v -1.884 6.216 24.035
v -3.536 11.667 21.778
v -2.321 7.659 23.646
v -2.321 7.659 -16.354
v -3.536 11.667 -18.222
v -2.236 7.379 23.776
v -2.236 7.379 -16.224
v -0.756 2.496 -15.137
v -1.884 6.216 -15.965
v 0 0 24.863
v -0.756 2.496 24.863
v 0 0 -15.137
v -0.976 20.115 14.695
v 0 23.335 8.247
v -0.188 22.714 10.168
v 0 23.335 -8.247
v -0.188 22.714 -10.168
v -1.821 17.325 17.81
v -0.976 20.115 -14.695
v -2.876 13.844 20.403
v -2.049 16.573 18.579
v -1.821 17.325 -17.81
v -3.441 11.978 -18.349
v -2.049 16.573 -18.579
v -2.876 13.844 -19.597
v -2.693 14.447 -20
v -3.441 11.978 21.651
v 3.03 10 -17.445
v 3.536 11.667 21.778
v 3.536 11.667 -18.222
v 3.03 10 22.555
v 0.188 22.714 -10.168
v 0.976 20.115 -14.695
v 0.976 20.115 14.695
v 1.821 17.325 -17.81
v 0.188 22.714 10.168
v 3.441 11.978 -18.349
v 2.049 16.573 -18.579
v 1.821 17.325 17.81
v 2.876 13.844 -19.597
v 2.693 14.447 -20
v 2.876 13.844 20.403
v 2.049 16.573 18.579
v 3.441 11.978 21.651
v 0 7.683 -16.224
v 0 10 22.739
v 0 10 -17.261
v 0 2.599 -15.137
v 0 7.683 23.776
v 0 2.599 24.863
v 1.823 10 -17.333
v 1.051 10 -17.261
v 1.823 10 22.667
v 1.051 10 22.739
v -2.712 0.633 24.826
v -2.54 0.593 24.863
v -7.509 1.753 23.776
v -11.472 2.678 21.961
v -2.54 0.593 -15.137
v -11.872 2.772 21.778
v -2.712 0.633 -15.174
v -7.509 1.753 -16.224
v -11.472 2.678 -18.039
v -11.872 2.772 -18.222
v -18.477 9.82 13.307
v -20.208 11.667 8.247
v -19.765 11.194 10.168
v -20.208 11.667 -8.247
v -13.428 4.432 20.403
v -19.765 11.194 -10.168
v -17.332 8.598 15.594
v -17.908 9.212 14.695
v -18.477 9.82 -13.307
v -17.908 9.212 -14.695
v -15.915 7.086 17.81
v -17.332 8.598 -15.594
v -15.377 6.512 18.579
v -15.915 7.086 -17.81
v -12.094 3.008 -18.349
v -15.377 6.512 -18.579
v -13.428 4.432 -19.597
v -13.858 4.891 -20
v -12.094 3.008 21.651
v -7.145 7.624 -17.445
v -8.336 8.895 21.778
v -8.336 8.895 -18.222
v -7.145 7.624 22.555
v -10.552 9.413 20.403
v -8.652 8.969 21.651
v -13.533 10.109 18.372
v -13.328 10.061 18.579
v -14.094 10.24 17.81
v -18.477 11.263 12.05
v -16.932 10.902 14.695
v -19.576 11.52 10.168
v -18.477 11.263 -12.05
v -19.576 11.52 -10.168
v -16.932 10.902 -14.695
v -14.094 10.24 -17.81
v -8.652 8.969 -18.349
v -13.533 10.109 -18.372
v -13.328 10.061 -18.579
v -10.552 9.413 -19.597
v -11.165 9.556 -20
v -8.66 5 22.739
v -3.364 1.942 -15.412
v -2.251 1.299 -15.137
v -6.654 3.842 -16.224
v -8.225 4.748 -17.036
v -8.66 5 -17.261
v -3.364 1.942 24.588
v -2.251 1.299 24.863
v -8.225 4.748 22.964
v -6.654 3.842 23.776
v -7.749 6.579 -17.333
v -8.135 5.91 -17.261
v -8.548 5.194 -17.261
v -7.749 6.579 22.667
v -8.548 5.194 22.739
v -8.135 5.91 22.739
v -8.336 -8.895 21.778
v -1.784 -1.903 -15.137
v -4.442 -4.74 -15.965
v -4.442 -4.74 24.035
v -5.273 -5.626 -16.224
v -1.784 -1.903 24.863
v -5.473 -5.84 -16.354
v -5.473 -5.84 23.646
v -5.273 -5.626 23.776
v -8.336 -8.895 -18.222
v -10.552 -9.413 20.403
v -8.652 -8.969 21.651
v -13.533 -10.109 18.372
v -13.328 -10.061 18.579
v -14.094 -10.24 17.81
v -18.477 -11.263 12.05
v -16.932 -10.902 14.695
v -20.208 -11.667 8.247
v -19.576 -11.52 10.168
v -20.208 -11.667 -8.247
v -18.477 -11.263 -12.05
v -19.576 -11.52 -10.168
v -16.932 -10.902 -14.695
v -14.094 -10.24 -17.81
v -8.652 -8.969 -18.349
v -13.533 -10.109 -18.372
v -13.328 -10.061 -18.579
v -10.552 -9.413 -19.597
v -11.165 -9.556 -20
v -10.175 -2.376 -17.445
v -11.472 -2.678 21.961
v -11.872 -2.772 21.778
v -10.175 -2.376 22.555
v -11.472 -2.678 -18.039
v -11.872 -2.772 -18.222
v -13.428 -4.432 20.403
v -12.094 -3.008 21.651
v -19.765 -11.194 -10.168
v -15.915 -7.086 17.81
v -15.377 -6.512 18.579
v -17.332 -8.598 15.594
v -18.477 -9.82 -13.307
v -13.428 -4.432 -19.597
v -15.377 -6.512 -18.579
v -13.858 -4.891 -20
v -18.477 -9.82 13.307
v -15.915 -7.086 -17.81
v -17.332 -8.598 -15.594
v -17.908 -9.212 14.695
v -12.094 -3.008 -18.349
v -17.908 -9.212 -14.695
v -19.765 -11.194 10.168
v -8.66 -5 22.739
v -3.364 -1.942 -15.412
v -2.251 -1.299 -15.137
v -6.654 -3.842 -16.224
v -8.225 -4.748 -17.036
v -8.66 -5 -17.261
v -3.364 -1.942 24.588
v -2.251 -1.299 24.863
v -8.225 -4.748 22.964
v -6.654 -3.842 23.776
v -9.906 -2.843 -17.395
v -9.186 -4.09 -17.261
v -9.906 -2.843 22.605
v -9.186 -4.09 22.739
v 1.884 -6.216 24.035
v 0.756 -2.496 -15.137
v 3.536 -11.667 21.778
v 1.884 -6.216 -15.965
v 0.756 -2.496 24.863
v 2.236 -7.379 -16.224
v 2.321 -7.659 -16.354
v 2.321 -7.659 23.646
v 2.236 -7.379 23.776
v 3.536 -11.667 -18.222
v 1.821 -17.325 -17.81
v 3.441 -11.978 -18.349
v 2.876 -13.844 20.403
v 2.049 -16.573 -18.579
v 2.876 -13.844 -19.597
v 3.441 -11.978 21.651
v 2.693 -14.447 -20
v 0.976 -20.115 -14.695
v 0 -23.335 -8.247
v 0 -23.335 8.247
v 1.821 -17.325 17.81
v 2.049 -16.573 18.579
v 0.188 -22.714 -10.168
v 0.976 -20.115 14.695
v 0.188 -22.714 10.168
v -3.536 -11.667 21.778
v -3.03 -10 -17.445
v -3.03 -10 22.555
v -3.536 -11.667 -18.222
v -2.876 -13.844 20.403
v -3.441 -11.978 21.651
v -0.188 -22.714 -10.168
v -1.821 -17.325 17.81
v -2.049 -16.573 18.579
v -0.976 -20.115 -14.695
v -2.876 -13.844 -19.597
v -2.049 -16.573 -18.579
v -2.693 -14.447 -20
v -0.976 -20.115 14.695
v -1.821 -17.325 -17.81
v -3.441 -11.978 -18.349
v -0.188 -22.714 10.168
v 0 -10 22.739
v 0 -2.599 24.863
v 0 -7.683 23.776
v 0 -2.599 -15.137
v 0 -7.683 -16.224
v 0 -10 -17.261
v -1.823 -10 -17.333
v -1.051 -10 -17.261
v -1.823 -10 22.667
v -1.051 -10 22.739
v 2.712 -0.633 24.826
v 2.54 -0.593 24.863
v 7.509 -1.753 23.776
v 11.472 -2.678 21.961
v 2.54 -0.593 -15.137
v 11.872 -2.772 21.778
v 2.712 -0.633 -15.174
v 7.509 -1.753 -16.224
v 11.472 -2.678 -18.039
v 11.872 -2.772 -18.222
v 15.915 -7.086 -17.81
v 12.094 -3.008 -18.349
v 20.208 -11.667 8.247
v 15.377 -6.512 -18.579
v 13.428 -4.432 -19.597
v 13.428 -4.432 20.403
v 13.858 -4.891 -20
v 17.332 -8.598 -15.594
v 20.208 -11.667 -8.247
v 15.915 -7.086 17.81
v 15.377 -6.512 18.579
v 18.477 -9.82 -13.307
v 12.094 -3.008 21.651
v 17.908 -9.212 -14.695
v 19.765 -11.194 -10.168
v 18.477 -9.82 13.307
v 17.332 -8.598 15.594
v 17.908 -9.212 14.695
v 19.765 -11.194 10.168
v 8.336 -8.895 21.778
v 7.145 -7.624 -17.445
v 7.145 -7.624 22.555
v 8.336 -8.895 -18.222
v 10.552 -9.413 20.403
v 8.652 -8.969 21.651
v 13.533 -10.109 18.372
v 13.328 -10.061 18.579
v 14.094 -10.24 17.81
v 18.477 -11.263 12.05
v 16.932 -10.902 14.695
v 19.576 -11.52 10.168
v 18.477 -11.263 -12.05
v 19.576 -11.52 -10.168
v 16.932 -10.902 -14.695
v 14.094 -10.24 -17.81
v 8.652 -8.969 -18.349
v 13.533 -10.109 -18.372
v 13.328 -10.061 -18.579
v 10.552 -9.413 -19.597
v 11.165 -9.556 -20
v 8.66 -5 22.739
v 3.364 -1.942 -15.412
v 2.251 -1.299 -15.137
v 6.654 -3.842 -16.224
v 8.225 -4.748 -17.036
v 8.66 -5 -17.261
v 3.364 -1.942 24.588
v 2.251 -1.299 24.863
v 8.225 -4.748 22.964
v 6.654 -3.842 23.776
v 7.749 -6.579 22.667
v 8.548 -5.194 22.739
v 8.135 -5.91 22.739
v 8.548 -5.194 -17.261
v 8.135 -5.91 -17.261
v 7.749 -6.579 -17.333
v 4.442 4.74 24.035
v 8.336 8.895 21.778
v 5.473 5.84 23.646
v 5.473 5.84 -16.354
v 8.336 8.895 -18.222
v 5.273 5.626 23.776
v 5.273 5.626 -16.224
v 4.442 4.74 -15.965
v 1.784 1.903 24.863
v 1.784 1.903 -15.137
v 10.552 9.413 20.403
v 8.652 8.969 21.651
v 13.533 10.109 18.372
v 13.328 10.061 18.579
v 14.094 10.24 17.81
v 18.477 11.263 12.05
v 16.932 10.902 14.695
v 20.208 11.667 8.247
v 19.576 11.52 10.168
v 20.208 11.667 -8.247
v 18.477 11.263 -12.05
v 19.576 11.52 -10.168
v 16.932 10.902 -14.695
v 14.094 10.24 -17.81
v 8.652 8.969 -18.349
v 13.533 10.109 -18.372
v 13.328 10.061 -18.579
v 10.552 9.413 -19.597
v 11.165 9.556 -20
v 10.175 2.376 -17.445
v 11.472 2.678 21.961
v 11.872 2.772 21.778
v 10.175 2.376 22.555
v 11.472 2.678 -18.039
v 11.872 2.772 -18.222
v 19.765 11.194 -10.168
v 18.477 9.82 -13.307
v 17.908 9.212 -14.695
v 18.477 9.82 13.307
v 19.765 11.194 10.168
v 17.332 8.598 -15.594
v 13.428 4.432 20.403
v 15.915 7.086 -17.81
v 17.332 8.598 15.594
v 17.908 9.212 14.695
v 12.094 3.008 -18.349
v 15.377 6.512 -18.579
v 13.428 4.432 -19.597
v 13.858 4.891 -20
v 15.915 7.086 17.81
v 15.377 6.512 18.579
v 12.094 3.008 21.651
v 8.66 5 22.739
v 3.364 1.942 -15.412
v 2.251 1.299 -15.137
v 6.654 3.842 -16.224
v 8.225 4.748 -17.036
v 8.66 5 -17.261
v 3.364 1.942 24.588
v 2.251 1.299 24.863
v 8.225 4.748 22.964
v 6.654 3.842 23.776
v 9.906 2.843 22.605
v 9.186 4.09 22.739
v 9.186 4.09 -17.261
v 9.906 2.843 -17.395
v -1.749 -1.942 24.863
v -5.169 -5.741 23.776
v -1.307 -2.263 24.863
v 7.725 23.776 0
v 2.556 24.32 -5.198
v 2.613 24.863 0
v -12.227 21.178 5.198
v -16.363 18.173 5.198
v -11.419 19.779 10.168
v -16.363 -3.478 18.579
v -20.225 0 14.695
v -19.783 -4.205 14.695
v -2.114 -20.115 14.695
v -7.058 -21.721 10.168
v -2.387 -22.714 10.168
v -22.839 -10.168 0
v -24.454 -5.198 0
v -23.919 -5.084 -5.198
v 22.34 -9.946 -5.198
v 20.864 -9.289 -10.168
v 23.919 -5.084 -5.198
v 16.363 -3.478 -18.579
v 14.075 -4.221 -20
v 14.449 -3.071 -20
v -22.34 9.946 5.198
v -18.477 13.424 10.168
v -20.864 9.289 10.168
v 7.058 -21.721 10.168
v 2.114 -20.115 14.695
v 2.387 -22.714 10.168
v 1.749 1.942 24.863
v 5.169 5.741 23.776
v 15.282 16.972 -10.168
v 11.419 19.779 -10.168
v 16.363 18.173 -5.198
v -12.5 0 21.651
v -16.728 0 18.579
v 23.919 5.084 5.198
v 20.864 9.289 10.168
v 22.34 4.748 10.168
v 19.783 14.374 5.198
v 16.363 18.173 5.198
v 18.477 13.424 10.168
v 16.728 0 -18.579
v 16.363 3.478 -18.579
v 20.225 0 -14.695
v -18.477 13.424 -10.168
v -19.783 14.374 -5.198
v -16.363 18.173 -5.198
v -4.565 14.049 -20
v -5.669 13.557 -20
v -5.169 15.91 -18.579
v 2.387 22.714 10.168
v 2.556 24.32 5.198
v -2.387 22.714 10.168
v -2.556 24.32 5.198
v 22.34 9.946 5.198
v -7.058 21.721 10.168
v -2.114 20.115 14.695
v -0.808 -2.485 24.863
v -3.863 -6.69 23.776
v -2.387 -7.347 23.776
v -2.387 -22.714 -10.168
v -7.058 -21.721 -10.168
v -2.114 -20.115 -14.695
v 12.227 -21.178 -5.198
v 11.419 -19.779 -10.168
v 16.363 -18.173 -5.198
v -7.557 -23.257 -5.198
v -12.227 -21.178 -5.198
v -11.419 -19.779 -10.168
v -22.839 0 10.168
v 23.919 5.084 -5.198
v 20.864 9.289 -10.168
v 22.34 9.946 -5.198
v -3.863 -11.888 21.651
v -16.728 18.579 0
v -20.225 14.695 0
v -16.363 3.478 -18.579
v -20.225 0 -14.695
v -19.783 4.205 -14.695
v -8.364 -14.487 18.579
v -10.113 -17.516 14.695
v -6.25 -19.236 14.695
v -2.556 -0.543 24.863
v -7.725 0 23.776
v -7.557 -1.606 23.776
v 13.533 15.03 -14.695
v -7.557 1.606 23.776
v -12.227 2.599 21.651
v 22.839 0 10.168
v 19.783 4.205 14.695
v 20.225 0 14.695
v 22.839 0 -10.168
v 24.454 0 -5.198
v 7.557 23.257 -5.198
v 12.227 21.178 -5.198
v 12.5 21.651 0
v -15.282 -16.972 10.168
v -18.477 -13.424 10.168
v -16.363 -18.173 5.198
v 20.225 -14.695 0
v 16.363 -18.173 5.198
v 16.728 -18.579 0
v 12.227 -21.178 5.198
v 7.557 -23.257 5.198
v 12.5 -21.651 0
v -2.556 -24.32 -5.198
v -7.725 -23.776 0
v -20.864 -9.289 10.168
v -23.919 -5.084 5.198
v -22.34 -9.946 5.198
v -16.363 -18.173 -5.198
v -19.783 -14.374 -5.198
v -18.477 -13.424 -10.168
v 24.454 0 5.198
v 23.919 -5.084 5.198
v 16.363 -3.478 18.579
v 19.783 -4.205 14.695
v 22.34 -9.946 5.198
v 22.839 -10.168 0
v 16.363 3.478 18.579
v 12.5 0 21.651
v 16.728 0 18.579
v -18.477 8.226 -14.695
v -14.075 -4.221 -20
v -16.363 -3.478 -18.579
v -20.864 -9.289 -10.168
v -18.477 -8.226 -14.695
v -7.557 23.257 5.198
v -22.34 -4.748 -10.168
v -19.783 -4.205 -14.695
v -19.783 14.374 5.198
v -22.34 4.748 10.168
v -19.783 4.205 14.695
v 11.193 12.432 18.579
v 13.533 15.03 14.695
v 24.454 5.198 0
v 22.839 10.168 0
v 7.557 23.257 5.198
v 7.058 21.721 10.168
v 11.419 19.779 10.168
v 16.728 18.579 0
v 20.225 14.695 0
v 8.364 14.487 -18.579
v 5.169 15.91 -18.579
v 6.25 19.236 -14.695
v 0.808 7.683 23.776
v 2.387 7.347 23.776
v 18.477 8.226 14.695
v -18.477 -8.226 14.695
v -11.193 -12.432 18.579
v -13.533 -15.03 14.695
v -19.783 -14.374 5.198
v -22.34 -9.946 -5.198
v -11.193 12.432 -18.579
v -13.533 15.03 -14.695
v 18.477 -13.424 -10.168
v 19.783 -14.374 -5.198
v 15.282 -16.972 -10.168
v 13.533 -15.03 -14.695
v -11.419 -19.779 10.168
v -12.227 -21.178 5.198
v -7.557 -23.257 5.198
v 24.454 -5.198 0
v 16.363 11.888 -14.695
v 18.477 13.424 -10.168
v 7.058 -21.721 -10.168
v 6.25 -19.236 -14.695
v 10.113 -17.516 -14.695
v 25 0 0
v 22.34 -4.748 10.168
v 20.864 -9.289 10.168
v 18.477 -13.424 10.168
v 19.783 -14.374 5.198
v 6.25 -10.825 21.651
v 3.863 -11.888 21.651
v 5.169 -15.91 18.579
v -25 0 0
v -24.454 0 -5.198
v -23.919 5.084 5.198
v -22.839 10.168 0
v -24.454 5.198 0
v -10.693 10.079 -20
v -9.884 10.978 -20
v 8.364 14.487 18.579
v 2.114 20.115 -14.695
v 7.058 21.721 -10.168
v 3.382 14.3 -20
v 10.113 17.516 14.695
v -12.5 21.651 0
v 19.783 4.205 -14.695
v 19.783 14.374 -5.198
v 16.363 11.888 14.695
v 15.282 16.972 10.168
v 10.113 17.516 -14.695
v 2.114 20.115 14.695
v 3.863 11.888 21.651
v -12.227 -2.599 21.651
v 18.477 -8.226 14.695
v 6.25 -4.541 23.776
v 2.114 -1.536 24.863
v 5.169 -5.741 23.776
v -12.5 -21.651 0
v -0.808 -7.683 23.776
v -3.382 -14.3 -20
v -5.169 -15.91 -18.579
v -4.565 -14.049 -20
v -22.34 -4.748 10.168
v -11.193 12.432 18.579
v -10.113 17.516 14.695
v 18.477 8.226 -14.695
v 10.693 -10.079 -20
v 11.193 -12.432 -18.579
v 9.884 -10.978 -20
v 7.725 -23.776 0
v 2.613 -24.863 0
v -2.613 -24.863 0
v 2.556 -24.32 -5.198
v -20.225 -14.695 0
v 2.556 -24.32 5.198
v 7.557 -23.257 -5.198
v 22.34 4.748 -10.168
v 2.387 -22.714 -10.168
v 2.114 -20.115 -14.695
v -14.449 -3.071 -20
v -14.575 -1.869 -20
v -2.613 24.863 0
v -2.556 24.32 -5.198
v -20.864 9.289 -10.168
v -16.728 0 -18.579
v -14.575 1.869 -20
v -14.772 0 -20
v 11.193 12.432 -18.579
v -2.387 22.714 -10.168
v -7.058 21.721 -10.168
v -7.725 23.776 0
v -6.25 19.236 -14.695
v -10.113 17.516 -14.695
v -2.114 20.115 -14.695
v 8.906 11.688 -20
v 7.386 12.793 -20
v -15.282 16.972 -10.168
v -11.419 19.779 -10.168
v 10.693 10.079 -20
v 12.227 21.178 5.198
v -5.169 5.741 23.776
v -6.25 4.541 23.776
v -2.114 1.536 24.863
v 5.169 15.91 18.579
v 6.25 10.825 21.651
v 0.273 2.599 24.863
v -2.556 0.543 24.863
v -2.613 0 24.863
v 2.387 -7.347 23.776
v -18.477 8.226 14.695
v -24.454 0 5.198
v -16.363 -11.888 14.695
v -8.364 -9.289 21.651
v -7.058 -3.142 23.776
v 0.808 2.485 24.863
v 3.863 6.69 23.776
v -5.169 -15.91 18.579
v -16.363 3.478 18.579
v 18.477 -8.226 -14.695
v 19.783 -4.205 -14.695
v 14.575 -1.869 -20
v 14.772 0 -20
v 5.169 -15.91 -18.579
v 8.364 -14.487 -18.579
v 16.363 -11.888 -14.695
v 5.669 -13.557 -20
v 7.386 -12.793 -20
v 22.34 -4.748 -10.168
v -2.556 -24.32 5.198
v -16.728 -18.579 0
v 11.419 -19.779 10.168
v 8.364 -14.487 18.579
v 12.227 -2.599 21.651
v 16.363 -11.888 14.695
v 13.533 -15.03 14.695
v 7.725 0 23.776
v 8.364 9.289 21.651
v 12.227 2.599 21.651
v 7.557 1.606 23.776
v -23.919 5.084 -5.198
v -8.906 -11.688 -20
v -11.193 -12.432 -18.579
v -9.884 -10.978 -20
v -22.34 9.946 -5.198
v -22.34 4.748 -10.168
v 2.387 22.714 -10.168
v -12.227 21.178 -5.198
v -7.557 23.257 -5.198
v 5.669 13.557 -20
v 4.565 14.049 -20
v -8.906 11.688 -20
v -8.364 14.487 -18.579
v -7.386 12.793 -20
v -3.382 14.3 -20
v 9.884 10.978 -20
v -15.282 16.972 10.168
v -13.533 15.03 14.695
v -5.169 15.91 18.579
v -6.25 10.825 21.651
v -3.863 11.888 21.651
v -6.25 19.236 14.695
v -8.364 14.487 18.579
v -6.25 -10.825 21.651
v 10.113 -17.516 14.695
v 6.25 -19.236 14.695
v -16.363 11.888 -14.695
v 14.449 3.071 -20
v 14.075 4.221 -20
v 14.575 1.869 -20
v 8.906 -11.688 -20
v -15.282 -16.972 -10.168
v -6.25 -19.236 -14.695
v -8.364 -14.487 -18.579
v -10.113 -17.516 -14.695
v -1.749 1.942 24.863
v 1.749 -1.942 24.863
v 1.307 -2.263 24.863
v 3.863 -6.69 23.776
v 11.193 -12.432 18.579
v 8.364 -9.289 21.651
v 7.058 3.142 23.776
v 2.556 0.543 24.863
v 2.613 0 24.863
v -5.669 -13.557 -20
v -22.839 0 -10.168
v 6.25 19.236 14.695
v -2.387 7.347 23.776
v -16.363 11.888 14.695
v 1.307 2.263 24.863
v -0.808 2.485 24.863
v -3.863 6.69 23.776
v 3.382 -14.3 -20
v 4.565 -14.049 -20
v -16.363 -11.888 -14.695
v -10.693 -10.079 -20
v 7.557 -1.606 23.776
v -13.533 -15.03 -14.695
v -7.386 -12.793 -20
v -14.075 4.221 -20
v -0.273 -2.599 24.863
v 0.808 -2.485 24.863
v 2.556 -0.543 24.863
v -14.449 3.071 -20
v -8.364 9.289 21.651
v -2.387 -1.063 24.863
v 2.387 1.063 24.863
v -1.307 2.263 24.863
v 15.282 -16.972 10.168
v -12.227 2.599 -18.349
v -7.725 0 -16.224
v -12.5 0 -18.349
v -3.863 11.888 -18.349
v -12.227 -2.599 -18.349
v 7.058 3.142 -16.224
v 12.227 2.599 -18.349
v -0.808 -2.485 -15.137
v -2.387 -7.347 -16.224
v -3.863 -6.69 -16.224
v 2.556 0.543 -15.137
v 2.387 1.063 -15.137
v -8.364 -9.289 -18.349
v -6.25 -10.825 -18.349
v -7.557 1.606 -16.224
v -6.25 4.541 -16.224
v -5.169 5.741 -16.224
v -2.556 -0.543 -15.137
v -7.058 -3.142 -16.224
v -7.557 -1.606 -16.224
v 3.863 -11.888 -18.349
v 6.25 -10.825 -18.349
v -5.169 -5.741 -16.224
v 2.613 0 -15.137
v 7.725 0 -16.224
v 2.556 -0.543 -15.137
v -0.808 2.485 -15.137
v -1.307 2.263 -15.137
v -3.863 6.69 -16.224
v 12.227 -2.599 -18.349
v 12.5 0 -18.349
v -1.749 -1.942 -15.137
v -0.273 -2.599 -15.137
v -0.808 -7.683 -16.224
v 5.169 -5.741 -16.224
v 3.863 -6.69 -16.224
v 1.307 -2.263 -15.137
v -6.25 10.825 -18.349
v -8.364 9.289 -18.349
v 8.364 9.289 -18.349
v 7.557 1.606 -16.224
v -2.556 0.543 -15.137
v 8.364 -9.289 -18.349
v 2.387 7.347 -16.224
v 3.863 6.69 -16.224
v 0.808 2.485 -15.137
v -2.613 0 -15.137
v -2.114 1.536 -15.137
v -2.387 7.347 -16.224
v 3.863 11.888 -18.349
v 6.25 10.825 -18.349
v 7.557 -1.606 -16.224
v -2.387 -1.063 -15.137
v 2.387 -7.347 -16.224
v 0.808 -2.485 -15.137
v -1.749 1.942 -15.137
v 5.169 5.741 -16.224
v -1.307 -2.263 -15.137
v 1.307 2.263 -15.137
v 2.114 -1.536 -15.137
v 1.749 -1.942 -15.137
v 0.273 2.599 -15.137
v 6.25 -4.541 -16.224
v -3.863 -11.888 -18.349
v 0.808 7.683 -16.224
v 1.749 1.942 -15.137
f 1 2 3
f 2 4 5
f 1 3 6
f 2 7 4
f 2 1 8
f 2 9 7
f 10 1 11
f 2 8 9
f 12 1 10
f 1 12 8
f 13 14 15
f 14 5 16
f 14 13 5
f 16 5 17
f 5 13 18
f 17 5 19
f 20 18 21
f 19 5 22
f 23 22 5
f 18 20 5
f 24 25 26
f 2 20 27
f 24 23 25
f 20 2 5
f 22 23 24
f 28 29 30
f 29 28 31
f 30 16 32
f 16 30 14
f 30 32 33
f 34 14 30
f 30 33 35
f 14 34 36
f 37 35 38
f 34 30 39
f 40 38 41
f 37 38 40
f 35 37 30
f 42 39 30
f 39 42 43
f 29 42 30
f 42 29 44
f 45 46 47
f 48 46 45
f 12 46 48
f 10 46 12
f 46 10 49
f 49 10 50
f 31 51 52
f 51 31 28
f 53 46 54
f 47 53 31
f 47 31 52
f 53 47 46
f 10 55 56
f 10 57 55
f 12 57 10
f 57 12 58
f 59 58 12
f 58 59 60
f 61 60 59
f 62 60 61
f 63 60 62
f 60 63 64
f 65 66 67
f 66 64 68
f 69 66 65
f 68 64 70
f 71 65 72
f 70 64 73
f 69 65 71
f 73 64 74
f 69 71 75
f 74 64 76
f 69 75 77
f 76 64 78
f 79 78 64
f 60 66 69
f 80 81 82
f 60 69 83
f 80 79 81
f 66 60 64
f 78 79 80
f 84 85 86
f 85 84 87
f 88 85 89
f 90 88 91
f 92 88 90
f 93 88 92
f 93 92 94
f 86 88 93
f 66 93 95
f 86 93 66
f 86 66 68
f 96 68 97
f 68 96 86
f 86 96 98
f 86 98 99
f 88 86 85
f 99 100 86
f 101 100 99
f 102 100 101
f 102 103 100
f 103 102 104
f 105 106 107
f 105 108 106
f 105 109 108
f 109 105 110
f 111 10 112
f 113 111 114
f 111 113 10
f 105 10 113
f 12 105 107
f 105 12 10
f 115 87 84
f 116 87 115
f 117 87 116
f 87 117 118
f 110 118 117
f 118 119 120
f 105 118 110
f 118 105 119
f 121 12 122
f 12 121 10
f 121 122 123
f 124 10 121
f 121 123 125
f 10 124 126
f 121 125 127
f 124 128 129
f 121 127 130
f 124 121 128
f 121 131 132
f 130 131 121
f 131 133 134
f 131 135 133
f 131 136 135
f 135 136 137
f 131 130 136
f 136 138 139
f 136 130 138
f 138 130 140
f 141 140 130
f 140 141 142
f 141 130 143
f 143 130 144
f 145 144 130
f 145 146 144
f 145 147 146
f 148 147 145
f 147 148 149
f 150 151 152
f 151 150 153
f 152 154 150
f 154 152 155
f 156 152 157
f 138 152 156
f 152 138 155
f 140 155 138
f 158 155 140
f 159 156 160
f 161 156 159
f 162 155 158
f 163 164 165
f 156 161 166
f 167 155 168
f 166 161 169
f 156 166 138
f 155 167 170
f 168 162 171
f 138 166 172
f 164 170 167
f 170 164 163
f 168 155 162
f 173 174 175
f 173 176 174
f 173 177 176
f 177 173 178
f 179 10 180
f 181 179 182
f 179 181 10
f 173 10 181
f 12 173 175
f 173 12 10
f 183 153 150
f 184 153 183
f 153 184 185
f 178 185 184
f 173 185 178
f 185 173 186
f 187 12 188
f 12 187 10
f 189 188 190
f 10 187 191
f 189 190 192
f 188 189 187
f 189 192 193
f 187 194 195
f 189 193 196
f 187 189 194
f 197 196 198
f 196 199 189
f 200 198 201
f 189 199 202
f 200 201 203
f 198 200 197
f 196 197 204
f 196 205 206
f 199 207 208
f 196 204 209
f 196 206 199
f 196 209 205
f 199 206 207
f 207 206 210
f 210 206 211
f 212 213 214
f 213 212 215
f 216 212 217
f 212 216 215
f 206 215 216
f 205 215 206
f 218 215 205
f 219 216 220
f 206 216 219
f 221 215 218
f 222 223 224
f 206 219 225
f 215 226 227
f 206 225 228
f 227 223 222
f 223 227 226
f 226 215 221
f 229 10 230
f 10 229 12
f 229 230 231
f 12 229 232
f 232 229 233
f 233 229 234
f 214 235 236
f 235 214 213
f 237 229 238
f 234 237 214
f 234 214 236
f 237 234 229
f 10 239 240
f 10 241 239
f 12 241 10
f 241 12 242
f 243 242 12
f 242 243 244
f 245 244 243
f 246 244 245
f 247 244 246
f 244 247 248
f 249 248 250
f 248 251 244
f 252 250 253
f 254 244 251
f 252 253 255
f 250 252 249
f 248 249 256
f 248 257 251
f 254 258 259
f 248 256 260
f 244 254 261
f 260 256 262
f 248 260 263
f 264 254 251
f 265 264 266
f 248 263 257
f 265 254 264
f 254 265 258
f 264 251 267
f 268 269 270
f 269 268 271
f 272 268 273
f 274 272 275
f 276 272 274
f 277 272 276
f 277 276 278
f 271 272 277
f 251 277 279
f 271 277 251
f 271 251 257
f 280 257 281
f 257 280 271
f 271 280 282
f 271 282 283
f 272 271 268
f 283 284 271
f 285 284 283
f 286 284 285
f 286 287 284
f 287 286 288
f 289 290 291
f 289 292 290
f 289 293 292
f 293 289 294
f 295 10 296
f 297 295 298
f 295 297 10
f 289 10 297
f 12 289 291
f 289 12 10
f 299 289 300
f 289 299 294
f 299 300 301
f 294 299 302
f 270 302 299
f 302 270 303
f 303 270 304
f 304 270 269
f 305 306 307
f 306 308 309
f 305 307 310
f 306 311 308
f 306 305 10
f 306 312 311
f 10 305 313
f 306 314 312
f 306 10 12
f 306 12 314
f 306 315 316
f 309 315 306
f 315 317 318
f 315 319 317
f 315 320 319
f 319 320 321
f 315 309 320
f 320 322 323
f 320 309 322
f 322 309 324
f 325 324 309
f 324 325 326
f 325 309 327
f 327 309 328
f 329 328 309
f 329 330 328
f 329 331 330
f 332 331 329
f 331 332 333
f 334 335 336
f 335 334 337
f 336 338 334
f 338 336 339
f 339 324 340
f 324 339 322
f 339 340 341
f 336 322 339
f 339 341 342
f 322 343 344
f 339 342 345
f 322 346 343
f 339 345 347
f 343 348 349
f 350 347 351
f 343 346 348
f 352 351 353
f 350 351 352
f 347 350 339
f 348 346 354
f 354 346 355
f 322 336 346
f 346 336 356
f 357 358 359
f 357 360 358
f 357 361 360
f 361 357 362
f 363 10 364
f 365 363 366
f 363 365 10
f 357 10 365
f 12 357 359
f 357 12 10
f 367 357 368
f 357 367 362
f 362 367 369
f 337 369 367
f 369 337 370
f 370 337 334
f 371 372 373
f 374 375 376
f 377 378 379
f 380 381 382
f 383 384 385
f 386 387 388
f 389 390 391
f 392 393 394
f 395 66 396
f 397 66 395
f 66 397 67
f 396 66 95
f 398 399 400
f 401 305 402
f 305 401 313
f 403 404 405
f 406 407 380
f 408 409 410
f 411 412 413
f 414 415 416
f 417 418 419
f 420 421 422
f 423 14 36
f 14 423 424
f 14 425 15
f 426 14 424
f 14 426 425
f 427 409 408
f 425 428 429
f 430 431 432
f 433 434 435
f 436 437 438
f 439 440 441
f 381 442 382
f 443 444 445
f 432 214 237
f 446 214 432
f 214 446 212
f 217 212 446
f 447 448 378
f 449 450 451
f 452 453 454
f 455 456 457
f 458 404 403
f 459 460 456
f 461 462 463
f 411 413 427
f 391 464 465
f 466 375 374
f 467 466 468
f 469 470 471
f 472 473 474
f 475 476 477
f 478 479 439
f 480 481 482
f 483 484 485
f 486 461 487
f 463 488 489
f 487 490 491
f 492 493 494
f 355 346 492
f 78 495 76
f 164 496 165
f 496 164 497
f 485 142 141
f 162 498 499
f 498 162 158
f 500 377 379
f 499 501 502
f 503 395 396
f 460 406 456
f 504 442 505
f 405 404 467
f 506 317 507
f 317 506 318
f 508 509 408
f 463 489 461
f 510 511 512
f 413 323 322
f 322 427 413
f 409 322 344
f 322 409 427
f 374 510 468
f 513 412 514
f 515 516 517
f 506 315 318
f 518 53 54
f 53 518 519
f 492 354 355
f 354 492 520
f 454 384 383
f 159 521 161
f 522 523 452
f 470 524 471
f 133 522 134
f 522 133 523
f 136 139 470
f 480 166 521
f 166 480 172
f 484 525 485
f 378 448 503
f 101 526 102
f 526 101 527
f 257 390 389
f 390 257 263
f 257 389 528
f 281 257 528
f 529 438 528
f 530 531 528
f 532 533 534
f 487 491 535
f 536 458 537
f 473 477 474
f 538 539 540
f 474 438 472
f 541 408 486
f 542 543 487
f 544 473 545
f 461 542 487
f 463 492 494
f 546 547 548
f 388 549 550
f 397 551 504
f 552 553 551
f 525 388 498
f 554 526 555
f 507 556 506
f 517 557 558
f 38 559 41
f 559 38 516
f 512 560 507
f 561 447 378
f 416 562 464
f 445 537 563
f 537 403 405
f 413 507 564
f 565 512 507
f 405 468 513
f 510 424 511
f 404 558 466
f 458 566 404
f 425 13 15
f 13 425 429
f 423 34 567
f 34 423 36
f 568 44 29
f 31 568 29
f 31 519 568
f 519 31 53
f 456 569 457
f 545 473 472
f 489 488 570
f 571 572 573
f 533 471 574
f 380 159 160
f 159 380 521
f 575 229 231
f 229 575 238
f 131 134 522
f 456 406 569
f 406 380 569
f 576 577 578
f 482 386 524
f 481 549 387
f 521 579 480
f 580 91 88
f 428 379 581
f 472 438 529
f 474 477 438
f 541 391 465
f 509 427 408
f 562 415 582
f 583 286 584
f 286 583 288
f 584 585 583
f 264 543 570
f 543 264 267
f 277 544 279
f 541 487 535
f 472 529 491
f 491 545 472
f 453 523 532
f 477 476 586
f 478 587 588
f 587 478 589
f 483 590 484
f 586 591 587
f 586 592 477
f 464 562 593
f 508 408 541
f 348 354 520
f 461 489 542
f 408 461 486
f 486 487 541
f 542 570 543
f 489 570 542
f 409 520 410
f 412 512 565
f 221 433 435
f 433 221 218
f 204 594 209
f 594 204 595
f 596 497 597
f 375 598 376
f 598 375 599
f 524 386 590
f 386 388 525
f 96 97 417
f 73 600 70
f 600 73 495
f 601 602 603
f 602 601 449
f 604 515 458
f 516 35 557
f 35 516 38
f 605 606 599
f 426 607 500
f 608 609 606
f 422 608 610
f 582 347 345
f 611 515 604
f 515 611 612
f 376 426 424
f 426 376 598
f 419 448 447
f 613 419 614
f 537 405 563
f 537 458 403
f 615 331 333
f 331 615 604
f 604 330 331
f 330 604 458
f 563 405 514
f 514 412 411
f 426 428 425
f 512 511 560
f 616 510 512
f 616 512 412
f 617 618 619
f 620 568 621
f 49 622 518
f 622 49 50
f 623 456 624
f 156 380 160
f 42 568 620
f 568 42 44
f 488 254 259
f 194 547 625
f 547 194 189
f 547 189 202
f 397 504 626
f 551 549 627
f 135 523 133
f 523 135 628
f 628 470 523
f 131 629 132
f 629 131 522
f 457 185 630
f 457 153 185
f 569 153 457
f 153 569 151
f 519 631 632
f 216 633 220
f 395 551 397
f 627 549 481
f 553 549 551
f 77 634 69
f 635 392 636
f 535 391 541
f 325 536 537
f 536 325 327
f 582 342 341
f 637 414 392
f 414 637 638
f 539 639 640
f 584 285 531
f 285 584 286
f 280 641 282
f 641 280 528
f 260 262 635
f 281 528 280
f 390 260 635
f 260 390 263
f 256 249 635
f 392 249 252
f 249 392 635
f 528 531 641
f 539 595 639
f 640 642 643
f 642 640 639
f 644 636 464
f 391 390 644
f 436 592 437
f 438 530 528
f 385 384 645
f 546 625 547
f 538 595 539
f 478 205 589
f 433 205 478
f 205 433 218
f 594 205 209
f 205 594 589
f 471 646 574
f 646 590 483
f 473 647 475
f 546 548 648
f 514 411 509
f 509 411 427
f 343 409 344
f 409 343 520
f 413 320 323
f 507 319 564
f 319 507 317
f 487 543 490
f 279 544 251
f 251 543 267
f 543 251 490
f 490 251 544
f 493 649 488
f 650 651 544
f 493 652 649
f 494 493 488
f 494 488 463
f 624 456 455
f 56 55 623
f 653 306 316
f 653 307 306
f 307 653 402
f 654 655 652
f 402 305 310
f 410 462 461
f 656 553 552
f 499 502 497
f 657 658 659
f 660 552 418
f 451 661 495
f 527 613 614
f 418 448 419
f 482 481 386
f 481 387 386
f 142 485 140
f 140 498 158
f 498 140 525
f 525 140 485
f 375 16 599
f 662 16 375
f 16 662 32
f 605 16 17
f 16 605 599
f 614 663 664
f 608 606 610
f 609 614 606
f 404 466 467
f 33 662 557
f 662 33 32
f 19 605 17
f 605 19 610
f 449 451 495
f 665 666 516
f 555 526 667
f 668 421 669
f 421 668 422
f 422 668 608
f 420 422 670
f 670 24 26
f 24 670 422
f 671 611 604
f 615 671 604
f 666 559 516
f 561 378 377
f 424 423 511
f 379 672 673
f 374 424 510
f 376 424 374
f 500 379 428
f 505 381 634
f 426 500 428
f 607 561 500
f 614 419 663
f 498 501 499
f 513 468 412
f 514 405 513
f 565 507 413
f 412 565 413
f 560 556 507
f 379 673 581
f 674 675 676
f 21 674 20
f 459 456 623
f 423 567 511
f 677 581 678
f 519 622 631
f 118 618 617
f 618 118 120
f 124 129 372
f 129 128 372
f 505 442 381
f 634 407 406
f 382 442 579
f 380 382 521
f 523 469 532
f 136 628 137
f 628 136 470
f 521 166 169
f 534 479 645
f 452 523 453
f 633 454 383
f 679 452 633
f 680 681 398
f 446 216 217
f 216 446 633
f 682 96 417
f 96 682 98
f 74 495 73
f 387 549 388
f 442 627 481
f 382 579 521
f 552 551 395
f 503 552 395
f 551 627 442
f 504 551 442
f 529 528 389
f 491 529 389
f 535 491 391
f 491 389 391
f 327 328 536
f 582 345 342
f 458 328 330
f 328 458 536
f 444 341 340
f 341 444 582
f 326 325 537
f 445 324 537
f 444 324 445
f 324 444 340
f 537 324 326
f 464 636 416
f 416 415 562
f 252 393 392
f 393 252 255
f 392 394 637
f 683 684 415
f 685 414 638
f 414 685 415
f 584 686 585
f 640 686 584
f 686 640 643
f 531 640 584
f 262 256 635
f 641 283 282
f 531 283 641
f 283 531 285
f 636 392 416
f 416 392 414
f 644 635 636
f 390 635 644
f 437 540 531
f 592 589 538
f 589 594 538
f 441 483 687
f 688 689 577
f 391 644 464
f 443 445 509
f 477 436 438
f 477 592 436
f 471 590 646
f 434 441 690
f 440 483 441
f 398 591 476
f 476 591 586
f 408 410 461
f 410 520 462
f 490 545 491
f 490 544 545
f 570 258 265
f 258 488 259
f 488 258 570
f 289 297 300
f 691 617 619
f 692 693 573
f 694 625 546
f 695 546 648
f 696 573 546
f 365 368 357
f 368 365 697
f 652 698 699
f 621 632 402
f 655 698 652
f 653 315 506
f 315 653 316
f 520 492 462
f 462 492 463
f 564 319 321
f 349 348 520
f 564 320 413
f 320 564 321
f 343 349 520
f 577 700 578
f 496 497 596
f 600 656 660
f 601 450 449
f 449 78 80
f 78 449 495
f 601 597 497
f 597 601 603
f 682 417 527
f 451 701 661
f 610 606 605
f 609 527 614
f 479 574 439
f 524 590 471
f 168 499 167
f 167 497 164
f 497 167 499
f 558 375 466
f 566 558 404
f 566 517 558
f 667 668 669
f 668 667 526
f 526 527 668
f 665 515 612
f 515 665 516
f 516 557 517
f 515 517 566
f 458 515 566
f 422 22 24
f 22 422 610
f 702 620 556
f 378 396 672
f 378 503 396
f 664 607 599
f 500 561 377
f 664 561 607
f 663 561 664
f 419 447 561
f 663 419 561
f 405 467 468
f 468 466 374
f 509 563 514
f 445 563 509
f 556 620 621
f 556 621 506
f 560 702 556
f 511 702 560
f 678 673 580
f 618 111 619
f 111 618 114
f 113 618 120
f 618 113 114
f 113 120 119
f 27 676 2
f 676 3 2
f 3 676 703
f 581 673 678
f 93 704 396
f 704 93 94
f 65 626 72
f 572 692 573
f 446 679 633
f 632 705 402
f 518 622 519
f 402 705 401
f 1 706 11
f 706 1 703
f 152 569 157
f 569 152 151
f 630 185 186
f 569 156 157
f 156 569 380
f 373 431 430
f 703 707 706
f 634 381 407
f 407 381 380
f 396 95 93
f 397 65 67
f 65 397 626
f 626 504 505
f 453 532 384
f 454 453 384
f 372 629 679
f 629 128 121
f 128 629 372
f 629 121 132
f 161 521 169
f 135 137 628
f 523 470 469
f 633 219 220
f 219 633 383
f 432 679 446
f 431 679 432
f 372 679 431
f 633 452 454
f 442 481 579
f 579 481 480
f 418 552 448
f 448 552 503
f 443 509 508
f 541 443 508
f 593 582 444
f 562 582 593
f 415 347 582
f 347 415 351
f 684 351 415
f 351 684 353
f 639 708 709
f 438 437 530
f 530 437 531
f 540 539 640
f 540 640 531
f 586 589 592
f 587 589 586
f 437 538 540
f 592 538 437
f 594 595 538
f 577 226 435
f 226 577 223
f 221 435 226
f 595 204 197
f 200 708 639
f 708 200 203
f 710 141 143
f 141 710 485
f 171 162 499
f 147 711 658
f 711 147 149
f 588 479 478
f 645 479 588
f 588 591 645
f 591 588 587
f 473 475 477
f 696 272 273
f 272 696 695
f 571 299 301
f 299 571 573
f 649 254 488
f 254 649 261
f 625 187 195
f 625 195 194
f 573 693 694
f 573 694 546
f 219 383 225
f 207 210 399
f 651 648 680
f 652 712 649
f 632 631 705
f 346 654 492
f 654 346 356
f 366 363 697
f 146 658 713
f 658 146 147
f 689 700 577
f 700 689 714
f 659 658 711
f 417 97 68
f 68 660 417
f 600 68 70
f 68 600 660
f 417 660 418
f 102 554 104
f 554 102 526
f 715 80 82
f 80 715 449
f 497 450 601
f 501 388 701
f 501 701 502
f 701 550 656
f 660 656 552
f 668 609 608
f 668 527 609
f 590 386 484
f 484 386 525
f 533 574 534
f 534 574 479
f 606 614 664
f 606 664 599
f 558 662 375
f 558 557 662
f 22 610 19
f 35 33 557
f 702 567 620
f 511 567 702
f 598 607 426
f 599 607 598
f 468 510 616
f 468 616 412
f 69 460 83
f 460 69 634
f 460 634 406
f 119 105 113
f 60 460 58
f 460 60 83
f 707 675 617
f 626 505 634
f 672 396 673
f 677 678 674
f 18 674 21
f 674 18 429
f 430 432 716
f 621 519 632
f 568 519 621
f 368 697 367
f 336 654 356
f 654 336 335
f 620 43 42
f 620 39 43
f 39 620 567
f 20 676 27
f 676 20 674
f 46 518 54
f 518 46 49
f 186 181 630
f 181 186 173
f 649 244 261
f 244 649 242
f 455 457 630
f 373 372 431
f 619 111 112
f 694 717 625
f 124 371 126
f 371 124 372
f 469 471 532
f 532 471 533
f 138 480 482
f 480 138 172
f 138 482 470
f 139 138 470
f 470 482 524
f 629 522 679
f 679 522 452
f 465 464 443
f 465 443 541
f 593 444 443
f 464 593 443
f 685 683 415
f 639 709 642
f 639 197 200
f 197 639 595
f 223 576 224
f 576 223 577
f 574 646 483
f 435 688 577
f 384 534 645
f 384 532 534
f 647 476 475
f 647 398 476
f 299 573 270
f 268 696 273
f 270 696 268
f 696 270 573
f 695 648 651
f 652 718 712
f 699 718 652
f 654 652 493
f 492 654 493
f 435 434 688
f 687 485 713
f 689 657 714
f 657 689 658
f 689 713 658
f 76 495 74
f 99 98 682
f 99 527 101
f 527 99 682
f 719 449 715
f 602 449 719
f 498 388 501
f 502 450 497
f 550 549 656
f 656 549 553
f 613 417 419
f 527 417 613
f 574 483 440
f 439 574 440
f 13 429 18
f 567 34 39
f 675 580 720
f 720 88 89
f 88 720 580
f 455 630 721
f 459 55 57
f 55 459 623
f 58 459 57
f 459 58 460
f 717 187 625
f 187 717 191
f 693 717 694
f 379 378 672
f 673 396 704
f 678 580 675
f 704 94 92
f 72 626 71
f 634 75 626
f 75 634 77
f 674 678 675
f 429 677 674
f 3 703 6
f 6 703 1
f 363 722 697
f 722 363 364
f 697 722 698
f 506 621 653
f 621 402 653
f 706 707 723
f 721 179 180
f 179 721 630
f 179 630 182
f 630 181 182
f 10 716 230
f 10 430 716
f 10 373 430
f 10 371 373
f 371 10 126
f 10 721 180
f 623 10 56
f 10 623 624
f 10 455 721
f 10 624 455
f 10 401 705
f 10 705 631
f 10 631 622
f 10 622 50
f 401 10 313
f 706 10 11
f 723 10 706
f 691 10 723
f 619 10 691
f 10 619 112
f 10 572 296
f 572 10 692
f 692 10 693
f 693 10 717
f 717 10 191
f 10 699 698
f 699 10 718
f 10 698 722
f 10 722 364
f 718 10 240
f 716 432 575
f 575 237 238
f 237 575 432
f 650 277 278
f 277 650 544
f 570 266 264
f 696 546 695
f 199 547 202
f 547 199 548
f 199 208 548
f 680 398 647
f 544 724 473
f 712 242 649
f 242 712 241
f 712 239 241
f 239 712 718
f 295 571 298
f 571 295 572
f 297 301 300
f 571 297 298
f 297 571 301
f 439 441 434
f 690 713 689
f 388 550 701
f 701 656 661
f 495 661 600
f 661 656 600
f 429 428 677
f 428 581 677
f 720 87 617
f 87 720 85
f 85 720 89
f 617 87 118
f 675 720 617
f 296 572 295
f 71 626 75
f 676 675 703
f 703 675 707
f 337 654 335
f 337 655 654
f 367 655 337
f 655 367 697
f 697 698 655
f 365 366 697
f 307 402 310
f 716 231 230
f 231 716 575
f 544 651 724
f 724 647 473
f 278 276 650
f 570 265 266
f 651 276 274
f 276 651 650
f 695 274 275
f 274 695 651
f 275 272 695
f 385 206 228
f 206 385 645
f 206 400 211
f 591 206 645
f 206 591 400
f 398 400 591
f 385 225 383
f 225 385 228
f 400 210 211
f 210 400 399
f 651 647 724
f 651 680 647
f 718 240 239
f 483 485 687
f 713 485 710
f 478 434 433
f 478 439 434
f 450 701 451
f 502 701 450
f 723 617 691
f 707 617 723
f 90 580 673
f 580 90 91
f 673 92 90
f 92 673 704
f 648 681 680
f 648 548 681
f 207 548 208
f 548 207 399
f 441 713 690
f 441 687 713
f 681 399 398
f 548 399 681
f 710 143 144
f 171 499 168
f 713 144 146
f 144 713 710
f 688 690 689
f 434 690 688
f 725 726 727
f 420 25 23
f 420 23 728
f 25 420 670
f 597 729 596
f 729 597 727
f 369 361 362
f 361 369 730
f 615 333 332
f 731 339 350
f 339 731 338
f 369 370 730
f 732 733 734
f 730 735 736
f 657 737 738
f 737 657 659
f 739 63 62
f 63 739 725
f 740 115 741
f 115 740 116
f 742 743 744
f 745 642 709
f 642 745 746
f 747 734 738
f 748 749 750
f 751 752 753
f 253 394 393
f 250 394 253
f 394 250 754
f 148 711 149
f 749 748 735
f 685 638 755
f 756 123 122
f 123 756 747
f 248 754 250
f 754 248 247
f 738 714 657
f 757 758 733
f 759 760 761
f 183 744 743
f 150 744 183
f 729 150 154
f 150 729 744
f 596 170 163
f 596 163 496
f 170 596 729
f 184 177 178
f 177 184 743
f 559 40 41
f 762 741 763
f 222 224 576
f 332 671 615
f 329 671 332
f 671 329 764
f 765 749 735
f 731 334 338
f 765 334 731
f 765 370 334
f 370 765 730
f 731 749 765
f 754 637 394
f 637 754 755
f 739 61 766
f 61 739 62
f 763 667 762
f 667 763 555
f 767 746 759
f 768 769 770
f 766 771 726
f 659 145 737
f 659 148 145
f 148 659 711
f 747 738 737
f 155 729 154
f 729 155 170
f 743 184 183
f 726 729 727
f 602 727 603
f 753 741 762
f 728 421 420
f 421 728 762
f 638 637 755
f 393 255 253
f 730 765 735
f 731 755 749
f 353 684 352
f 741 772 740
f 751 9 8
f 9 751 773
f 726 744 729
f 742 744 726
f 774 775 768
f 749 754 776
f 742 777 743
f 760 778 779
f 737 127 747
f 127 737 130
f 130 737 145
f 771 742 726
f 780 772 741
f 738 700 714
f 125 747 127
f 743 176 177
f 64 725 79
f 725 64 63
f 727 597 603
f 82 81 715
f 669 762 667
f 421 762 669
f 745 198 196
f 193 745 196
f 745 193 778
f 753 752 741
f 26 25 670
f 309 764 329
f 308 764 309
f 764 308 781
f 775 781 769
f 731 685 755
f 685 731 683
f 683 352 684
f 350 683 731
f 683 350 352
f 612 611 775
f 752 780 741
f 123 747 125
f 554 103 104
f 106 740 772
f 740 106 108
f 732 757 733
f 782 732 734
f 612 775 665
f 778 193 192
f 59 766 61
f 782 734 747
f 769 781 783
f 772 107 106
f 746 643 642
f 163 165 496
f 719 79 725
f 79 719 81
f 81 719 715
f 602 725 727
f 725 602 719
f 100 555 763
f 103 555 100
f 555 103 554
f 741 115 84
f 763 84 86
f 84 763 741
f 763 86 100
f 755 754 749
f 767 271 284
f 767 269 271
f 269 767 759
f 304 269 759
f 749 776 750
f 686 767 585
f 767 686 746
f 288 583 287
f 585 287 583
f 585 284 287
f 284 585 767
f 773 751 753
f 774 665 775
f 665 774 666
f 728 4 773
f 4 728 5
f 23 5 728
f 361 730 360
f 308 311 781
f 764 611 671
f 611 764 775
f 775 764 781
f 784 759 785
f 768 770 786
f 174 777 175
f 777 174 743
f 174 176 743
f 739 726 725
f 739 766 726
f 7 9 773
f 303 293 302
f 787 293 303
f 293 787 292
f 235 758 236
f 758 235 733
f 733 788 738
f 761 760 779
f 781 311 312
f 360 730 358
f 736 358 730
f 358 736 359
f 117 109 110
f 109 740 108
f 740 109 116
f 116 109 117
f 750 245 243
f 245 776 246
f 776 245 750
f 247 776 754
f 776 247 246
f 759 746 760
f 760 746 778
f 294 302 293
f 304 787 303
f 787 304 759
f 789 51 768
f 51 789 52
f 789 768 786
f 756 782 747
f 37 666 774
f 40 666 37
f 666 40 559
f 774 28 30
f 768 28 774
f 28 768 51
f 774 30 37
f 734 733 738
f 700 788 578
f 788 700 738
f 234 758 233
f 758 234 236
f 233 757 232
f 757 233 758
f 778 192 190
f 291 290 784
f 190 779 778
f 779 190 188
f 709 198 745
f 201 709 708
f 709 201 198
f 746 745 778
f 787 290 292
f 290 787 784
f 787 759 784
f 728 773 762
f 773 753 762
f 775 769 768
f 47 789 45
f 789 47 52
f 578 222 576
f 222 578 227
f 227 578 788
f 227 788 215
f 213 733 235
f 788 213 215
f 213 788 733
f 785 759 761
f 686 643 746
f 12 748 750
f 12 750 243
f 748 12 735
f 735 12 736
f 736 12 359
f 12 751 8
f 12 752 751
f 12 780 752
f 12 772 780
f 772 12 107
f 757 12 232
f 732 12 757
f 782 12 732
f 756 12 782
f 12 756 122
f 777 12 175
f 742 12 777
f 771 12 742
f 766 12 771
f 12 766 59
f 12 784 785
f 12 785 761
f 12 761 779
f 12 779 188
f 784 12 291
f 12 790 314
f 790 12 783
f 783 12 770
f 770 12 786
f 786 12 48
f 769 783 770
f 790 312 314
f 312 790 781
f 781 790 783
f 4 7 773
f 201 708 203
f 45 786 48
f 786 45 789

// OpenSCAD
difference()
{
    sphere(d = 50, $fn=30);
    for(i=[0:5]) {
        rotate([0,0,60*i]) {
            difference() {
                scale([1,3.3,1]) {
                    rotate([0,0,45]) {
                        translate([0,0,-50]) {
                            cube([5, 5, 100]);
                        }
                    }
                }
                translate([0,0,-50]) {
                    cube([10,10,100]);
                }
            }
        }
    }
    translate([0,0,-40]) {
        sphere(d = 50, $fn=30);
    }
}
